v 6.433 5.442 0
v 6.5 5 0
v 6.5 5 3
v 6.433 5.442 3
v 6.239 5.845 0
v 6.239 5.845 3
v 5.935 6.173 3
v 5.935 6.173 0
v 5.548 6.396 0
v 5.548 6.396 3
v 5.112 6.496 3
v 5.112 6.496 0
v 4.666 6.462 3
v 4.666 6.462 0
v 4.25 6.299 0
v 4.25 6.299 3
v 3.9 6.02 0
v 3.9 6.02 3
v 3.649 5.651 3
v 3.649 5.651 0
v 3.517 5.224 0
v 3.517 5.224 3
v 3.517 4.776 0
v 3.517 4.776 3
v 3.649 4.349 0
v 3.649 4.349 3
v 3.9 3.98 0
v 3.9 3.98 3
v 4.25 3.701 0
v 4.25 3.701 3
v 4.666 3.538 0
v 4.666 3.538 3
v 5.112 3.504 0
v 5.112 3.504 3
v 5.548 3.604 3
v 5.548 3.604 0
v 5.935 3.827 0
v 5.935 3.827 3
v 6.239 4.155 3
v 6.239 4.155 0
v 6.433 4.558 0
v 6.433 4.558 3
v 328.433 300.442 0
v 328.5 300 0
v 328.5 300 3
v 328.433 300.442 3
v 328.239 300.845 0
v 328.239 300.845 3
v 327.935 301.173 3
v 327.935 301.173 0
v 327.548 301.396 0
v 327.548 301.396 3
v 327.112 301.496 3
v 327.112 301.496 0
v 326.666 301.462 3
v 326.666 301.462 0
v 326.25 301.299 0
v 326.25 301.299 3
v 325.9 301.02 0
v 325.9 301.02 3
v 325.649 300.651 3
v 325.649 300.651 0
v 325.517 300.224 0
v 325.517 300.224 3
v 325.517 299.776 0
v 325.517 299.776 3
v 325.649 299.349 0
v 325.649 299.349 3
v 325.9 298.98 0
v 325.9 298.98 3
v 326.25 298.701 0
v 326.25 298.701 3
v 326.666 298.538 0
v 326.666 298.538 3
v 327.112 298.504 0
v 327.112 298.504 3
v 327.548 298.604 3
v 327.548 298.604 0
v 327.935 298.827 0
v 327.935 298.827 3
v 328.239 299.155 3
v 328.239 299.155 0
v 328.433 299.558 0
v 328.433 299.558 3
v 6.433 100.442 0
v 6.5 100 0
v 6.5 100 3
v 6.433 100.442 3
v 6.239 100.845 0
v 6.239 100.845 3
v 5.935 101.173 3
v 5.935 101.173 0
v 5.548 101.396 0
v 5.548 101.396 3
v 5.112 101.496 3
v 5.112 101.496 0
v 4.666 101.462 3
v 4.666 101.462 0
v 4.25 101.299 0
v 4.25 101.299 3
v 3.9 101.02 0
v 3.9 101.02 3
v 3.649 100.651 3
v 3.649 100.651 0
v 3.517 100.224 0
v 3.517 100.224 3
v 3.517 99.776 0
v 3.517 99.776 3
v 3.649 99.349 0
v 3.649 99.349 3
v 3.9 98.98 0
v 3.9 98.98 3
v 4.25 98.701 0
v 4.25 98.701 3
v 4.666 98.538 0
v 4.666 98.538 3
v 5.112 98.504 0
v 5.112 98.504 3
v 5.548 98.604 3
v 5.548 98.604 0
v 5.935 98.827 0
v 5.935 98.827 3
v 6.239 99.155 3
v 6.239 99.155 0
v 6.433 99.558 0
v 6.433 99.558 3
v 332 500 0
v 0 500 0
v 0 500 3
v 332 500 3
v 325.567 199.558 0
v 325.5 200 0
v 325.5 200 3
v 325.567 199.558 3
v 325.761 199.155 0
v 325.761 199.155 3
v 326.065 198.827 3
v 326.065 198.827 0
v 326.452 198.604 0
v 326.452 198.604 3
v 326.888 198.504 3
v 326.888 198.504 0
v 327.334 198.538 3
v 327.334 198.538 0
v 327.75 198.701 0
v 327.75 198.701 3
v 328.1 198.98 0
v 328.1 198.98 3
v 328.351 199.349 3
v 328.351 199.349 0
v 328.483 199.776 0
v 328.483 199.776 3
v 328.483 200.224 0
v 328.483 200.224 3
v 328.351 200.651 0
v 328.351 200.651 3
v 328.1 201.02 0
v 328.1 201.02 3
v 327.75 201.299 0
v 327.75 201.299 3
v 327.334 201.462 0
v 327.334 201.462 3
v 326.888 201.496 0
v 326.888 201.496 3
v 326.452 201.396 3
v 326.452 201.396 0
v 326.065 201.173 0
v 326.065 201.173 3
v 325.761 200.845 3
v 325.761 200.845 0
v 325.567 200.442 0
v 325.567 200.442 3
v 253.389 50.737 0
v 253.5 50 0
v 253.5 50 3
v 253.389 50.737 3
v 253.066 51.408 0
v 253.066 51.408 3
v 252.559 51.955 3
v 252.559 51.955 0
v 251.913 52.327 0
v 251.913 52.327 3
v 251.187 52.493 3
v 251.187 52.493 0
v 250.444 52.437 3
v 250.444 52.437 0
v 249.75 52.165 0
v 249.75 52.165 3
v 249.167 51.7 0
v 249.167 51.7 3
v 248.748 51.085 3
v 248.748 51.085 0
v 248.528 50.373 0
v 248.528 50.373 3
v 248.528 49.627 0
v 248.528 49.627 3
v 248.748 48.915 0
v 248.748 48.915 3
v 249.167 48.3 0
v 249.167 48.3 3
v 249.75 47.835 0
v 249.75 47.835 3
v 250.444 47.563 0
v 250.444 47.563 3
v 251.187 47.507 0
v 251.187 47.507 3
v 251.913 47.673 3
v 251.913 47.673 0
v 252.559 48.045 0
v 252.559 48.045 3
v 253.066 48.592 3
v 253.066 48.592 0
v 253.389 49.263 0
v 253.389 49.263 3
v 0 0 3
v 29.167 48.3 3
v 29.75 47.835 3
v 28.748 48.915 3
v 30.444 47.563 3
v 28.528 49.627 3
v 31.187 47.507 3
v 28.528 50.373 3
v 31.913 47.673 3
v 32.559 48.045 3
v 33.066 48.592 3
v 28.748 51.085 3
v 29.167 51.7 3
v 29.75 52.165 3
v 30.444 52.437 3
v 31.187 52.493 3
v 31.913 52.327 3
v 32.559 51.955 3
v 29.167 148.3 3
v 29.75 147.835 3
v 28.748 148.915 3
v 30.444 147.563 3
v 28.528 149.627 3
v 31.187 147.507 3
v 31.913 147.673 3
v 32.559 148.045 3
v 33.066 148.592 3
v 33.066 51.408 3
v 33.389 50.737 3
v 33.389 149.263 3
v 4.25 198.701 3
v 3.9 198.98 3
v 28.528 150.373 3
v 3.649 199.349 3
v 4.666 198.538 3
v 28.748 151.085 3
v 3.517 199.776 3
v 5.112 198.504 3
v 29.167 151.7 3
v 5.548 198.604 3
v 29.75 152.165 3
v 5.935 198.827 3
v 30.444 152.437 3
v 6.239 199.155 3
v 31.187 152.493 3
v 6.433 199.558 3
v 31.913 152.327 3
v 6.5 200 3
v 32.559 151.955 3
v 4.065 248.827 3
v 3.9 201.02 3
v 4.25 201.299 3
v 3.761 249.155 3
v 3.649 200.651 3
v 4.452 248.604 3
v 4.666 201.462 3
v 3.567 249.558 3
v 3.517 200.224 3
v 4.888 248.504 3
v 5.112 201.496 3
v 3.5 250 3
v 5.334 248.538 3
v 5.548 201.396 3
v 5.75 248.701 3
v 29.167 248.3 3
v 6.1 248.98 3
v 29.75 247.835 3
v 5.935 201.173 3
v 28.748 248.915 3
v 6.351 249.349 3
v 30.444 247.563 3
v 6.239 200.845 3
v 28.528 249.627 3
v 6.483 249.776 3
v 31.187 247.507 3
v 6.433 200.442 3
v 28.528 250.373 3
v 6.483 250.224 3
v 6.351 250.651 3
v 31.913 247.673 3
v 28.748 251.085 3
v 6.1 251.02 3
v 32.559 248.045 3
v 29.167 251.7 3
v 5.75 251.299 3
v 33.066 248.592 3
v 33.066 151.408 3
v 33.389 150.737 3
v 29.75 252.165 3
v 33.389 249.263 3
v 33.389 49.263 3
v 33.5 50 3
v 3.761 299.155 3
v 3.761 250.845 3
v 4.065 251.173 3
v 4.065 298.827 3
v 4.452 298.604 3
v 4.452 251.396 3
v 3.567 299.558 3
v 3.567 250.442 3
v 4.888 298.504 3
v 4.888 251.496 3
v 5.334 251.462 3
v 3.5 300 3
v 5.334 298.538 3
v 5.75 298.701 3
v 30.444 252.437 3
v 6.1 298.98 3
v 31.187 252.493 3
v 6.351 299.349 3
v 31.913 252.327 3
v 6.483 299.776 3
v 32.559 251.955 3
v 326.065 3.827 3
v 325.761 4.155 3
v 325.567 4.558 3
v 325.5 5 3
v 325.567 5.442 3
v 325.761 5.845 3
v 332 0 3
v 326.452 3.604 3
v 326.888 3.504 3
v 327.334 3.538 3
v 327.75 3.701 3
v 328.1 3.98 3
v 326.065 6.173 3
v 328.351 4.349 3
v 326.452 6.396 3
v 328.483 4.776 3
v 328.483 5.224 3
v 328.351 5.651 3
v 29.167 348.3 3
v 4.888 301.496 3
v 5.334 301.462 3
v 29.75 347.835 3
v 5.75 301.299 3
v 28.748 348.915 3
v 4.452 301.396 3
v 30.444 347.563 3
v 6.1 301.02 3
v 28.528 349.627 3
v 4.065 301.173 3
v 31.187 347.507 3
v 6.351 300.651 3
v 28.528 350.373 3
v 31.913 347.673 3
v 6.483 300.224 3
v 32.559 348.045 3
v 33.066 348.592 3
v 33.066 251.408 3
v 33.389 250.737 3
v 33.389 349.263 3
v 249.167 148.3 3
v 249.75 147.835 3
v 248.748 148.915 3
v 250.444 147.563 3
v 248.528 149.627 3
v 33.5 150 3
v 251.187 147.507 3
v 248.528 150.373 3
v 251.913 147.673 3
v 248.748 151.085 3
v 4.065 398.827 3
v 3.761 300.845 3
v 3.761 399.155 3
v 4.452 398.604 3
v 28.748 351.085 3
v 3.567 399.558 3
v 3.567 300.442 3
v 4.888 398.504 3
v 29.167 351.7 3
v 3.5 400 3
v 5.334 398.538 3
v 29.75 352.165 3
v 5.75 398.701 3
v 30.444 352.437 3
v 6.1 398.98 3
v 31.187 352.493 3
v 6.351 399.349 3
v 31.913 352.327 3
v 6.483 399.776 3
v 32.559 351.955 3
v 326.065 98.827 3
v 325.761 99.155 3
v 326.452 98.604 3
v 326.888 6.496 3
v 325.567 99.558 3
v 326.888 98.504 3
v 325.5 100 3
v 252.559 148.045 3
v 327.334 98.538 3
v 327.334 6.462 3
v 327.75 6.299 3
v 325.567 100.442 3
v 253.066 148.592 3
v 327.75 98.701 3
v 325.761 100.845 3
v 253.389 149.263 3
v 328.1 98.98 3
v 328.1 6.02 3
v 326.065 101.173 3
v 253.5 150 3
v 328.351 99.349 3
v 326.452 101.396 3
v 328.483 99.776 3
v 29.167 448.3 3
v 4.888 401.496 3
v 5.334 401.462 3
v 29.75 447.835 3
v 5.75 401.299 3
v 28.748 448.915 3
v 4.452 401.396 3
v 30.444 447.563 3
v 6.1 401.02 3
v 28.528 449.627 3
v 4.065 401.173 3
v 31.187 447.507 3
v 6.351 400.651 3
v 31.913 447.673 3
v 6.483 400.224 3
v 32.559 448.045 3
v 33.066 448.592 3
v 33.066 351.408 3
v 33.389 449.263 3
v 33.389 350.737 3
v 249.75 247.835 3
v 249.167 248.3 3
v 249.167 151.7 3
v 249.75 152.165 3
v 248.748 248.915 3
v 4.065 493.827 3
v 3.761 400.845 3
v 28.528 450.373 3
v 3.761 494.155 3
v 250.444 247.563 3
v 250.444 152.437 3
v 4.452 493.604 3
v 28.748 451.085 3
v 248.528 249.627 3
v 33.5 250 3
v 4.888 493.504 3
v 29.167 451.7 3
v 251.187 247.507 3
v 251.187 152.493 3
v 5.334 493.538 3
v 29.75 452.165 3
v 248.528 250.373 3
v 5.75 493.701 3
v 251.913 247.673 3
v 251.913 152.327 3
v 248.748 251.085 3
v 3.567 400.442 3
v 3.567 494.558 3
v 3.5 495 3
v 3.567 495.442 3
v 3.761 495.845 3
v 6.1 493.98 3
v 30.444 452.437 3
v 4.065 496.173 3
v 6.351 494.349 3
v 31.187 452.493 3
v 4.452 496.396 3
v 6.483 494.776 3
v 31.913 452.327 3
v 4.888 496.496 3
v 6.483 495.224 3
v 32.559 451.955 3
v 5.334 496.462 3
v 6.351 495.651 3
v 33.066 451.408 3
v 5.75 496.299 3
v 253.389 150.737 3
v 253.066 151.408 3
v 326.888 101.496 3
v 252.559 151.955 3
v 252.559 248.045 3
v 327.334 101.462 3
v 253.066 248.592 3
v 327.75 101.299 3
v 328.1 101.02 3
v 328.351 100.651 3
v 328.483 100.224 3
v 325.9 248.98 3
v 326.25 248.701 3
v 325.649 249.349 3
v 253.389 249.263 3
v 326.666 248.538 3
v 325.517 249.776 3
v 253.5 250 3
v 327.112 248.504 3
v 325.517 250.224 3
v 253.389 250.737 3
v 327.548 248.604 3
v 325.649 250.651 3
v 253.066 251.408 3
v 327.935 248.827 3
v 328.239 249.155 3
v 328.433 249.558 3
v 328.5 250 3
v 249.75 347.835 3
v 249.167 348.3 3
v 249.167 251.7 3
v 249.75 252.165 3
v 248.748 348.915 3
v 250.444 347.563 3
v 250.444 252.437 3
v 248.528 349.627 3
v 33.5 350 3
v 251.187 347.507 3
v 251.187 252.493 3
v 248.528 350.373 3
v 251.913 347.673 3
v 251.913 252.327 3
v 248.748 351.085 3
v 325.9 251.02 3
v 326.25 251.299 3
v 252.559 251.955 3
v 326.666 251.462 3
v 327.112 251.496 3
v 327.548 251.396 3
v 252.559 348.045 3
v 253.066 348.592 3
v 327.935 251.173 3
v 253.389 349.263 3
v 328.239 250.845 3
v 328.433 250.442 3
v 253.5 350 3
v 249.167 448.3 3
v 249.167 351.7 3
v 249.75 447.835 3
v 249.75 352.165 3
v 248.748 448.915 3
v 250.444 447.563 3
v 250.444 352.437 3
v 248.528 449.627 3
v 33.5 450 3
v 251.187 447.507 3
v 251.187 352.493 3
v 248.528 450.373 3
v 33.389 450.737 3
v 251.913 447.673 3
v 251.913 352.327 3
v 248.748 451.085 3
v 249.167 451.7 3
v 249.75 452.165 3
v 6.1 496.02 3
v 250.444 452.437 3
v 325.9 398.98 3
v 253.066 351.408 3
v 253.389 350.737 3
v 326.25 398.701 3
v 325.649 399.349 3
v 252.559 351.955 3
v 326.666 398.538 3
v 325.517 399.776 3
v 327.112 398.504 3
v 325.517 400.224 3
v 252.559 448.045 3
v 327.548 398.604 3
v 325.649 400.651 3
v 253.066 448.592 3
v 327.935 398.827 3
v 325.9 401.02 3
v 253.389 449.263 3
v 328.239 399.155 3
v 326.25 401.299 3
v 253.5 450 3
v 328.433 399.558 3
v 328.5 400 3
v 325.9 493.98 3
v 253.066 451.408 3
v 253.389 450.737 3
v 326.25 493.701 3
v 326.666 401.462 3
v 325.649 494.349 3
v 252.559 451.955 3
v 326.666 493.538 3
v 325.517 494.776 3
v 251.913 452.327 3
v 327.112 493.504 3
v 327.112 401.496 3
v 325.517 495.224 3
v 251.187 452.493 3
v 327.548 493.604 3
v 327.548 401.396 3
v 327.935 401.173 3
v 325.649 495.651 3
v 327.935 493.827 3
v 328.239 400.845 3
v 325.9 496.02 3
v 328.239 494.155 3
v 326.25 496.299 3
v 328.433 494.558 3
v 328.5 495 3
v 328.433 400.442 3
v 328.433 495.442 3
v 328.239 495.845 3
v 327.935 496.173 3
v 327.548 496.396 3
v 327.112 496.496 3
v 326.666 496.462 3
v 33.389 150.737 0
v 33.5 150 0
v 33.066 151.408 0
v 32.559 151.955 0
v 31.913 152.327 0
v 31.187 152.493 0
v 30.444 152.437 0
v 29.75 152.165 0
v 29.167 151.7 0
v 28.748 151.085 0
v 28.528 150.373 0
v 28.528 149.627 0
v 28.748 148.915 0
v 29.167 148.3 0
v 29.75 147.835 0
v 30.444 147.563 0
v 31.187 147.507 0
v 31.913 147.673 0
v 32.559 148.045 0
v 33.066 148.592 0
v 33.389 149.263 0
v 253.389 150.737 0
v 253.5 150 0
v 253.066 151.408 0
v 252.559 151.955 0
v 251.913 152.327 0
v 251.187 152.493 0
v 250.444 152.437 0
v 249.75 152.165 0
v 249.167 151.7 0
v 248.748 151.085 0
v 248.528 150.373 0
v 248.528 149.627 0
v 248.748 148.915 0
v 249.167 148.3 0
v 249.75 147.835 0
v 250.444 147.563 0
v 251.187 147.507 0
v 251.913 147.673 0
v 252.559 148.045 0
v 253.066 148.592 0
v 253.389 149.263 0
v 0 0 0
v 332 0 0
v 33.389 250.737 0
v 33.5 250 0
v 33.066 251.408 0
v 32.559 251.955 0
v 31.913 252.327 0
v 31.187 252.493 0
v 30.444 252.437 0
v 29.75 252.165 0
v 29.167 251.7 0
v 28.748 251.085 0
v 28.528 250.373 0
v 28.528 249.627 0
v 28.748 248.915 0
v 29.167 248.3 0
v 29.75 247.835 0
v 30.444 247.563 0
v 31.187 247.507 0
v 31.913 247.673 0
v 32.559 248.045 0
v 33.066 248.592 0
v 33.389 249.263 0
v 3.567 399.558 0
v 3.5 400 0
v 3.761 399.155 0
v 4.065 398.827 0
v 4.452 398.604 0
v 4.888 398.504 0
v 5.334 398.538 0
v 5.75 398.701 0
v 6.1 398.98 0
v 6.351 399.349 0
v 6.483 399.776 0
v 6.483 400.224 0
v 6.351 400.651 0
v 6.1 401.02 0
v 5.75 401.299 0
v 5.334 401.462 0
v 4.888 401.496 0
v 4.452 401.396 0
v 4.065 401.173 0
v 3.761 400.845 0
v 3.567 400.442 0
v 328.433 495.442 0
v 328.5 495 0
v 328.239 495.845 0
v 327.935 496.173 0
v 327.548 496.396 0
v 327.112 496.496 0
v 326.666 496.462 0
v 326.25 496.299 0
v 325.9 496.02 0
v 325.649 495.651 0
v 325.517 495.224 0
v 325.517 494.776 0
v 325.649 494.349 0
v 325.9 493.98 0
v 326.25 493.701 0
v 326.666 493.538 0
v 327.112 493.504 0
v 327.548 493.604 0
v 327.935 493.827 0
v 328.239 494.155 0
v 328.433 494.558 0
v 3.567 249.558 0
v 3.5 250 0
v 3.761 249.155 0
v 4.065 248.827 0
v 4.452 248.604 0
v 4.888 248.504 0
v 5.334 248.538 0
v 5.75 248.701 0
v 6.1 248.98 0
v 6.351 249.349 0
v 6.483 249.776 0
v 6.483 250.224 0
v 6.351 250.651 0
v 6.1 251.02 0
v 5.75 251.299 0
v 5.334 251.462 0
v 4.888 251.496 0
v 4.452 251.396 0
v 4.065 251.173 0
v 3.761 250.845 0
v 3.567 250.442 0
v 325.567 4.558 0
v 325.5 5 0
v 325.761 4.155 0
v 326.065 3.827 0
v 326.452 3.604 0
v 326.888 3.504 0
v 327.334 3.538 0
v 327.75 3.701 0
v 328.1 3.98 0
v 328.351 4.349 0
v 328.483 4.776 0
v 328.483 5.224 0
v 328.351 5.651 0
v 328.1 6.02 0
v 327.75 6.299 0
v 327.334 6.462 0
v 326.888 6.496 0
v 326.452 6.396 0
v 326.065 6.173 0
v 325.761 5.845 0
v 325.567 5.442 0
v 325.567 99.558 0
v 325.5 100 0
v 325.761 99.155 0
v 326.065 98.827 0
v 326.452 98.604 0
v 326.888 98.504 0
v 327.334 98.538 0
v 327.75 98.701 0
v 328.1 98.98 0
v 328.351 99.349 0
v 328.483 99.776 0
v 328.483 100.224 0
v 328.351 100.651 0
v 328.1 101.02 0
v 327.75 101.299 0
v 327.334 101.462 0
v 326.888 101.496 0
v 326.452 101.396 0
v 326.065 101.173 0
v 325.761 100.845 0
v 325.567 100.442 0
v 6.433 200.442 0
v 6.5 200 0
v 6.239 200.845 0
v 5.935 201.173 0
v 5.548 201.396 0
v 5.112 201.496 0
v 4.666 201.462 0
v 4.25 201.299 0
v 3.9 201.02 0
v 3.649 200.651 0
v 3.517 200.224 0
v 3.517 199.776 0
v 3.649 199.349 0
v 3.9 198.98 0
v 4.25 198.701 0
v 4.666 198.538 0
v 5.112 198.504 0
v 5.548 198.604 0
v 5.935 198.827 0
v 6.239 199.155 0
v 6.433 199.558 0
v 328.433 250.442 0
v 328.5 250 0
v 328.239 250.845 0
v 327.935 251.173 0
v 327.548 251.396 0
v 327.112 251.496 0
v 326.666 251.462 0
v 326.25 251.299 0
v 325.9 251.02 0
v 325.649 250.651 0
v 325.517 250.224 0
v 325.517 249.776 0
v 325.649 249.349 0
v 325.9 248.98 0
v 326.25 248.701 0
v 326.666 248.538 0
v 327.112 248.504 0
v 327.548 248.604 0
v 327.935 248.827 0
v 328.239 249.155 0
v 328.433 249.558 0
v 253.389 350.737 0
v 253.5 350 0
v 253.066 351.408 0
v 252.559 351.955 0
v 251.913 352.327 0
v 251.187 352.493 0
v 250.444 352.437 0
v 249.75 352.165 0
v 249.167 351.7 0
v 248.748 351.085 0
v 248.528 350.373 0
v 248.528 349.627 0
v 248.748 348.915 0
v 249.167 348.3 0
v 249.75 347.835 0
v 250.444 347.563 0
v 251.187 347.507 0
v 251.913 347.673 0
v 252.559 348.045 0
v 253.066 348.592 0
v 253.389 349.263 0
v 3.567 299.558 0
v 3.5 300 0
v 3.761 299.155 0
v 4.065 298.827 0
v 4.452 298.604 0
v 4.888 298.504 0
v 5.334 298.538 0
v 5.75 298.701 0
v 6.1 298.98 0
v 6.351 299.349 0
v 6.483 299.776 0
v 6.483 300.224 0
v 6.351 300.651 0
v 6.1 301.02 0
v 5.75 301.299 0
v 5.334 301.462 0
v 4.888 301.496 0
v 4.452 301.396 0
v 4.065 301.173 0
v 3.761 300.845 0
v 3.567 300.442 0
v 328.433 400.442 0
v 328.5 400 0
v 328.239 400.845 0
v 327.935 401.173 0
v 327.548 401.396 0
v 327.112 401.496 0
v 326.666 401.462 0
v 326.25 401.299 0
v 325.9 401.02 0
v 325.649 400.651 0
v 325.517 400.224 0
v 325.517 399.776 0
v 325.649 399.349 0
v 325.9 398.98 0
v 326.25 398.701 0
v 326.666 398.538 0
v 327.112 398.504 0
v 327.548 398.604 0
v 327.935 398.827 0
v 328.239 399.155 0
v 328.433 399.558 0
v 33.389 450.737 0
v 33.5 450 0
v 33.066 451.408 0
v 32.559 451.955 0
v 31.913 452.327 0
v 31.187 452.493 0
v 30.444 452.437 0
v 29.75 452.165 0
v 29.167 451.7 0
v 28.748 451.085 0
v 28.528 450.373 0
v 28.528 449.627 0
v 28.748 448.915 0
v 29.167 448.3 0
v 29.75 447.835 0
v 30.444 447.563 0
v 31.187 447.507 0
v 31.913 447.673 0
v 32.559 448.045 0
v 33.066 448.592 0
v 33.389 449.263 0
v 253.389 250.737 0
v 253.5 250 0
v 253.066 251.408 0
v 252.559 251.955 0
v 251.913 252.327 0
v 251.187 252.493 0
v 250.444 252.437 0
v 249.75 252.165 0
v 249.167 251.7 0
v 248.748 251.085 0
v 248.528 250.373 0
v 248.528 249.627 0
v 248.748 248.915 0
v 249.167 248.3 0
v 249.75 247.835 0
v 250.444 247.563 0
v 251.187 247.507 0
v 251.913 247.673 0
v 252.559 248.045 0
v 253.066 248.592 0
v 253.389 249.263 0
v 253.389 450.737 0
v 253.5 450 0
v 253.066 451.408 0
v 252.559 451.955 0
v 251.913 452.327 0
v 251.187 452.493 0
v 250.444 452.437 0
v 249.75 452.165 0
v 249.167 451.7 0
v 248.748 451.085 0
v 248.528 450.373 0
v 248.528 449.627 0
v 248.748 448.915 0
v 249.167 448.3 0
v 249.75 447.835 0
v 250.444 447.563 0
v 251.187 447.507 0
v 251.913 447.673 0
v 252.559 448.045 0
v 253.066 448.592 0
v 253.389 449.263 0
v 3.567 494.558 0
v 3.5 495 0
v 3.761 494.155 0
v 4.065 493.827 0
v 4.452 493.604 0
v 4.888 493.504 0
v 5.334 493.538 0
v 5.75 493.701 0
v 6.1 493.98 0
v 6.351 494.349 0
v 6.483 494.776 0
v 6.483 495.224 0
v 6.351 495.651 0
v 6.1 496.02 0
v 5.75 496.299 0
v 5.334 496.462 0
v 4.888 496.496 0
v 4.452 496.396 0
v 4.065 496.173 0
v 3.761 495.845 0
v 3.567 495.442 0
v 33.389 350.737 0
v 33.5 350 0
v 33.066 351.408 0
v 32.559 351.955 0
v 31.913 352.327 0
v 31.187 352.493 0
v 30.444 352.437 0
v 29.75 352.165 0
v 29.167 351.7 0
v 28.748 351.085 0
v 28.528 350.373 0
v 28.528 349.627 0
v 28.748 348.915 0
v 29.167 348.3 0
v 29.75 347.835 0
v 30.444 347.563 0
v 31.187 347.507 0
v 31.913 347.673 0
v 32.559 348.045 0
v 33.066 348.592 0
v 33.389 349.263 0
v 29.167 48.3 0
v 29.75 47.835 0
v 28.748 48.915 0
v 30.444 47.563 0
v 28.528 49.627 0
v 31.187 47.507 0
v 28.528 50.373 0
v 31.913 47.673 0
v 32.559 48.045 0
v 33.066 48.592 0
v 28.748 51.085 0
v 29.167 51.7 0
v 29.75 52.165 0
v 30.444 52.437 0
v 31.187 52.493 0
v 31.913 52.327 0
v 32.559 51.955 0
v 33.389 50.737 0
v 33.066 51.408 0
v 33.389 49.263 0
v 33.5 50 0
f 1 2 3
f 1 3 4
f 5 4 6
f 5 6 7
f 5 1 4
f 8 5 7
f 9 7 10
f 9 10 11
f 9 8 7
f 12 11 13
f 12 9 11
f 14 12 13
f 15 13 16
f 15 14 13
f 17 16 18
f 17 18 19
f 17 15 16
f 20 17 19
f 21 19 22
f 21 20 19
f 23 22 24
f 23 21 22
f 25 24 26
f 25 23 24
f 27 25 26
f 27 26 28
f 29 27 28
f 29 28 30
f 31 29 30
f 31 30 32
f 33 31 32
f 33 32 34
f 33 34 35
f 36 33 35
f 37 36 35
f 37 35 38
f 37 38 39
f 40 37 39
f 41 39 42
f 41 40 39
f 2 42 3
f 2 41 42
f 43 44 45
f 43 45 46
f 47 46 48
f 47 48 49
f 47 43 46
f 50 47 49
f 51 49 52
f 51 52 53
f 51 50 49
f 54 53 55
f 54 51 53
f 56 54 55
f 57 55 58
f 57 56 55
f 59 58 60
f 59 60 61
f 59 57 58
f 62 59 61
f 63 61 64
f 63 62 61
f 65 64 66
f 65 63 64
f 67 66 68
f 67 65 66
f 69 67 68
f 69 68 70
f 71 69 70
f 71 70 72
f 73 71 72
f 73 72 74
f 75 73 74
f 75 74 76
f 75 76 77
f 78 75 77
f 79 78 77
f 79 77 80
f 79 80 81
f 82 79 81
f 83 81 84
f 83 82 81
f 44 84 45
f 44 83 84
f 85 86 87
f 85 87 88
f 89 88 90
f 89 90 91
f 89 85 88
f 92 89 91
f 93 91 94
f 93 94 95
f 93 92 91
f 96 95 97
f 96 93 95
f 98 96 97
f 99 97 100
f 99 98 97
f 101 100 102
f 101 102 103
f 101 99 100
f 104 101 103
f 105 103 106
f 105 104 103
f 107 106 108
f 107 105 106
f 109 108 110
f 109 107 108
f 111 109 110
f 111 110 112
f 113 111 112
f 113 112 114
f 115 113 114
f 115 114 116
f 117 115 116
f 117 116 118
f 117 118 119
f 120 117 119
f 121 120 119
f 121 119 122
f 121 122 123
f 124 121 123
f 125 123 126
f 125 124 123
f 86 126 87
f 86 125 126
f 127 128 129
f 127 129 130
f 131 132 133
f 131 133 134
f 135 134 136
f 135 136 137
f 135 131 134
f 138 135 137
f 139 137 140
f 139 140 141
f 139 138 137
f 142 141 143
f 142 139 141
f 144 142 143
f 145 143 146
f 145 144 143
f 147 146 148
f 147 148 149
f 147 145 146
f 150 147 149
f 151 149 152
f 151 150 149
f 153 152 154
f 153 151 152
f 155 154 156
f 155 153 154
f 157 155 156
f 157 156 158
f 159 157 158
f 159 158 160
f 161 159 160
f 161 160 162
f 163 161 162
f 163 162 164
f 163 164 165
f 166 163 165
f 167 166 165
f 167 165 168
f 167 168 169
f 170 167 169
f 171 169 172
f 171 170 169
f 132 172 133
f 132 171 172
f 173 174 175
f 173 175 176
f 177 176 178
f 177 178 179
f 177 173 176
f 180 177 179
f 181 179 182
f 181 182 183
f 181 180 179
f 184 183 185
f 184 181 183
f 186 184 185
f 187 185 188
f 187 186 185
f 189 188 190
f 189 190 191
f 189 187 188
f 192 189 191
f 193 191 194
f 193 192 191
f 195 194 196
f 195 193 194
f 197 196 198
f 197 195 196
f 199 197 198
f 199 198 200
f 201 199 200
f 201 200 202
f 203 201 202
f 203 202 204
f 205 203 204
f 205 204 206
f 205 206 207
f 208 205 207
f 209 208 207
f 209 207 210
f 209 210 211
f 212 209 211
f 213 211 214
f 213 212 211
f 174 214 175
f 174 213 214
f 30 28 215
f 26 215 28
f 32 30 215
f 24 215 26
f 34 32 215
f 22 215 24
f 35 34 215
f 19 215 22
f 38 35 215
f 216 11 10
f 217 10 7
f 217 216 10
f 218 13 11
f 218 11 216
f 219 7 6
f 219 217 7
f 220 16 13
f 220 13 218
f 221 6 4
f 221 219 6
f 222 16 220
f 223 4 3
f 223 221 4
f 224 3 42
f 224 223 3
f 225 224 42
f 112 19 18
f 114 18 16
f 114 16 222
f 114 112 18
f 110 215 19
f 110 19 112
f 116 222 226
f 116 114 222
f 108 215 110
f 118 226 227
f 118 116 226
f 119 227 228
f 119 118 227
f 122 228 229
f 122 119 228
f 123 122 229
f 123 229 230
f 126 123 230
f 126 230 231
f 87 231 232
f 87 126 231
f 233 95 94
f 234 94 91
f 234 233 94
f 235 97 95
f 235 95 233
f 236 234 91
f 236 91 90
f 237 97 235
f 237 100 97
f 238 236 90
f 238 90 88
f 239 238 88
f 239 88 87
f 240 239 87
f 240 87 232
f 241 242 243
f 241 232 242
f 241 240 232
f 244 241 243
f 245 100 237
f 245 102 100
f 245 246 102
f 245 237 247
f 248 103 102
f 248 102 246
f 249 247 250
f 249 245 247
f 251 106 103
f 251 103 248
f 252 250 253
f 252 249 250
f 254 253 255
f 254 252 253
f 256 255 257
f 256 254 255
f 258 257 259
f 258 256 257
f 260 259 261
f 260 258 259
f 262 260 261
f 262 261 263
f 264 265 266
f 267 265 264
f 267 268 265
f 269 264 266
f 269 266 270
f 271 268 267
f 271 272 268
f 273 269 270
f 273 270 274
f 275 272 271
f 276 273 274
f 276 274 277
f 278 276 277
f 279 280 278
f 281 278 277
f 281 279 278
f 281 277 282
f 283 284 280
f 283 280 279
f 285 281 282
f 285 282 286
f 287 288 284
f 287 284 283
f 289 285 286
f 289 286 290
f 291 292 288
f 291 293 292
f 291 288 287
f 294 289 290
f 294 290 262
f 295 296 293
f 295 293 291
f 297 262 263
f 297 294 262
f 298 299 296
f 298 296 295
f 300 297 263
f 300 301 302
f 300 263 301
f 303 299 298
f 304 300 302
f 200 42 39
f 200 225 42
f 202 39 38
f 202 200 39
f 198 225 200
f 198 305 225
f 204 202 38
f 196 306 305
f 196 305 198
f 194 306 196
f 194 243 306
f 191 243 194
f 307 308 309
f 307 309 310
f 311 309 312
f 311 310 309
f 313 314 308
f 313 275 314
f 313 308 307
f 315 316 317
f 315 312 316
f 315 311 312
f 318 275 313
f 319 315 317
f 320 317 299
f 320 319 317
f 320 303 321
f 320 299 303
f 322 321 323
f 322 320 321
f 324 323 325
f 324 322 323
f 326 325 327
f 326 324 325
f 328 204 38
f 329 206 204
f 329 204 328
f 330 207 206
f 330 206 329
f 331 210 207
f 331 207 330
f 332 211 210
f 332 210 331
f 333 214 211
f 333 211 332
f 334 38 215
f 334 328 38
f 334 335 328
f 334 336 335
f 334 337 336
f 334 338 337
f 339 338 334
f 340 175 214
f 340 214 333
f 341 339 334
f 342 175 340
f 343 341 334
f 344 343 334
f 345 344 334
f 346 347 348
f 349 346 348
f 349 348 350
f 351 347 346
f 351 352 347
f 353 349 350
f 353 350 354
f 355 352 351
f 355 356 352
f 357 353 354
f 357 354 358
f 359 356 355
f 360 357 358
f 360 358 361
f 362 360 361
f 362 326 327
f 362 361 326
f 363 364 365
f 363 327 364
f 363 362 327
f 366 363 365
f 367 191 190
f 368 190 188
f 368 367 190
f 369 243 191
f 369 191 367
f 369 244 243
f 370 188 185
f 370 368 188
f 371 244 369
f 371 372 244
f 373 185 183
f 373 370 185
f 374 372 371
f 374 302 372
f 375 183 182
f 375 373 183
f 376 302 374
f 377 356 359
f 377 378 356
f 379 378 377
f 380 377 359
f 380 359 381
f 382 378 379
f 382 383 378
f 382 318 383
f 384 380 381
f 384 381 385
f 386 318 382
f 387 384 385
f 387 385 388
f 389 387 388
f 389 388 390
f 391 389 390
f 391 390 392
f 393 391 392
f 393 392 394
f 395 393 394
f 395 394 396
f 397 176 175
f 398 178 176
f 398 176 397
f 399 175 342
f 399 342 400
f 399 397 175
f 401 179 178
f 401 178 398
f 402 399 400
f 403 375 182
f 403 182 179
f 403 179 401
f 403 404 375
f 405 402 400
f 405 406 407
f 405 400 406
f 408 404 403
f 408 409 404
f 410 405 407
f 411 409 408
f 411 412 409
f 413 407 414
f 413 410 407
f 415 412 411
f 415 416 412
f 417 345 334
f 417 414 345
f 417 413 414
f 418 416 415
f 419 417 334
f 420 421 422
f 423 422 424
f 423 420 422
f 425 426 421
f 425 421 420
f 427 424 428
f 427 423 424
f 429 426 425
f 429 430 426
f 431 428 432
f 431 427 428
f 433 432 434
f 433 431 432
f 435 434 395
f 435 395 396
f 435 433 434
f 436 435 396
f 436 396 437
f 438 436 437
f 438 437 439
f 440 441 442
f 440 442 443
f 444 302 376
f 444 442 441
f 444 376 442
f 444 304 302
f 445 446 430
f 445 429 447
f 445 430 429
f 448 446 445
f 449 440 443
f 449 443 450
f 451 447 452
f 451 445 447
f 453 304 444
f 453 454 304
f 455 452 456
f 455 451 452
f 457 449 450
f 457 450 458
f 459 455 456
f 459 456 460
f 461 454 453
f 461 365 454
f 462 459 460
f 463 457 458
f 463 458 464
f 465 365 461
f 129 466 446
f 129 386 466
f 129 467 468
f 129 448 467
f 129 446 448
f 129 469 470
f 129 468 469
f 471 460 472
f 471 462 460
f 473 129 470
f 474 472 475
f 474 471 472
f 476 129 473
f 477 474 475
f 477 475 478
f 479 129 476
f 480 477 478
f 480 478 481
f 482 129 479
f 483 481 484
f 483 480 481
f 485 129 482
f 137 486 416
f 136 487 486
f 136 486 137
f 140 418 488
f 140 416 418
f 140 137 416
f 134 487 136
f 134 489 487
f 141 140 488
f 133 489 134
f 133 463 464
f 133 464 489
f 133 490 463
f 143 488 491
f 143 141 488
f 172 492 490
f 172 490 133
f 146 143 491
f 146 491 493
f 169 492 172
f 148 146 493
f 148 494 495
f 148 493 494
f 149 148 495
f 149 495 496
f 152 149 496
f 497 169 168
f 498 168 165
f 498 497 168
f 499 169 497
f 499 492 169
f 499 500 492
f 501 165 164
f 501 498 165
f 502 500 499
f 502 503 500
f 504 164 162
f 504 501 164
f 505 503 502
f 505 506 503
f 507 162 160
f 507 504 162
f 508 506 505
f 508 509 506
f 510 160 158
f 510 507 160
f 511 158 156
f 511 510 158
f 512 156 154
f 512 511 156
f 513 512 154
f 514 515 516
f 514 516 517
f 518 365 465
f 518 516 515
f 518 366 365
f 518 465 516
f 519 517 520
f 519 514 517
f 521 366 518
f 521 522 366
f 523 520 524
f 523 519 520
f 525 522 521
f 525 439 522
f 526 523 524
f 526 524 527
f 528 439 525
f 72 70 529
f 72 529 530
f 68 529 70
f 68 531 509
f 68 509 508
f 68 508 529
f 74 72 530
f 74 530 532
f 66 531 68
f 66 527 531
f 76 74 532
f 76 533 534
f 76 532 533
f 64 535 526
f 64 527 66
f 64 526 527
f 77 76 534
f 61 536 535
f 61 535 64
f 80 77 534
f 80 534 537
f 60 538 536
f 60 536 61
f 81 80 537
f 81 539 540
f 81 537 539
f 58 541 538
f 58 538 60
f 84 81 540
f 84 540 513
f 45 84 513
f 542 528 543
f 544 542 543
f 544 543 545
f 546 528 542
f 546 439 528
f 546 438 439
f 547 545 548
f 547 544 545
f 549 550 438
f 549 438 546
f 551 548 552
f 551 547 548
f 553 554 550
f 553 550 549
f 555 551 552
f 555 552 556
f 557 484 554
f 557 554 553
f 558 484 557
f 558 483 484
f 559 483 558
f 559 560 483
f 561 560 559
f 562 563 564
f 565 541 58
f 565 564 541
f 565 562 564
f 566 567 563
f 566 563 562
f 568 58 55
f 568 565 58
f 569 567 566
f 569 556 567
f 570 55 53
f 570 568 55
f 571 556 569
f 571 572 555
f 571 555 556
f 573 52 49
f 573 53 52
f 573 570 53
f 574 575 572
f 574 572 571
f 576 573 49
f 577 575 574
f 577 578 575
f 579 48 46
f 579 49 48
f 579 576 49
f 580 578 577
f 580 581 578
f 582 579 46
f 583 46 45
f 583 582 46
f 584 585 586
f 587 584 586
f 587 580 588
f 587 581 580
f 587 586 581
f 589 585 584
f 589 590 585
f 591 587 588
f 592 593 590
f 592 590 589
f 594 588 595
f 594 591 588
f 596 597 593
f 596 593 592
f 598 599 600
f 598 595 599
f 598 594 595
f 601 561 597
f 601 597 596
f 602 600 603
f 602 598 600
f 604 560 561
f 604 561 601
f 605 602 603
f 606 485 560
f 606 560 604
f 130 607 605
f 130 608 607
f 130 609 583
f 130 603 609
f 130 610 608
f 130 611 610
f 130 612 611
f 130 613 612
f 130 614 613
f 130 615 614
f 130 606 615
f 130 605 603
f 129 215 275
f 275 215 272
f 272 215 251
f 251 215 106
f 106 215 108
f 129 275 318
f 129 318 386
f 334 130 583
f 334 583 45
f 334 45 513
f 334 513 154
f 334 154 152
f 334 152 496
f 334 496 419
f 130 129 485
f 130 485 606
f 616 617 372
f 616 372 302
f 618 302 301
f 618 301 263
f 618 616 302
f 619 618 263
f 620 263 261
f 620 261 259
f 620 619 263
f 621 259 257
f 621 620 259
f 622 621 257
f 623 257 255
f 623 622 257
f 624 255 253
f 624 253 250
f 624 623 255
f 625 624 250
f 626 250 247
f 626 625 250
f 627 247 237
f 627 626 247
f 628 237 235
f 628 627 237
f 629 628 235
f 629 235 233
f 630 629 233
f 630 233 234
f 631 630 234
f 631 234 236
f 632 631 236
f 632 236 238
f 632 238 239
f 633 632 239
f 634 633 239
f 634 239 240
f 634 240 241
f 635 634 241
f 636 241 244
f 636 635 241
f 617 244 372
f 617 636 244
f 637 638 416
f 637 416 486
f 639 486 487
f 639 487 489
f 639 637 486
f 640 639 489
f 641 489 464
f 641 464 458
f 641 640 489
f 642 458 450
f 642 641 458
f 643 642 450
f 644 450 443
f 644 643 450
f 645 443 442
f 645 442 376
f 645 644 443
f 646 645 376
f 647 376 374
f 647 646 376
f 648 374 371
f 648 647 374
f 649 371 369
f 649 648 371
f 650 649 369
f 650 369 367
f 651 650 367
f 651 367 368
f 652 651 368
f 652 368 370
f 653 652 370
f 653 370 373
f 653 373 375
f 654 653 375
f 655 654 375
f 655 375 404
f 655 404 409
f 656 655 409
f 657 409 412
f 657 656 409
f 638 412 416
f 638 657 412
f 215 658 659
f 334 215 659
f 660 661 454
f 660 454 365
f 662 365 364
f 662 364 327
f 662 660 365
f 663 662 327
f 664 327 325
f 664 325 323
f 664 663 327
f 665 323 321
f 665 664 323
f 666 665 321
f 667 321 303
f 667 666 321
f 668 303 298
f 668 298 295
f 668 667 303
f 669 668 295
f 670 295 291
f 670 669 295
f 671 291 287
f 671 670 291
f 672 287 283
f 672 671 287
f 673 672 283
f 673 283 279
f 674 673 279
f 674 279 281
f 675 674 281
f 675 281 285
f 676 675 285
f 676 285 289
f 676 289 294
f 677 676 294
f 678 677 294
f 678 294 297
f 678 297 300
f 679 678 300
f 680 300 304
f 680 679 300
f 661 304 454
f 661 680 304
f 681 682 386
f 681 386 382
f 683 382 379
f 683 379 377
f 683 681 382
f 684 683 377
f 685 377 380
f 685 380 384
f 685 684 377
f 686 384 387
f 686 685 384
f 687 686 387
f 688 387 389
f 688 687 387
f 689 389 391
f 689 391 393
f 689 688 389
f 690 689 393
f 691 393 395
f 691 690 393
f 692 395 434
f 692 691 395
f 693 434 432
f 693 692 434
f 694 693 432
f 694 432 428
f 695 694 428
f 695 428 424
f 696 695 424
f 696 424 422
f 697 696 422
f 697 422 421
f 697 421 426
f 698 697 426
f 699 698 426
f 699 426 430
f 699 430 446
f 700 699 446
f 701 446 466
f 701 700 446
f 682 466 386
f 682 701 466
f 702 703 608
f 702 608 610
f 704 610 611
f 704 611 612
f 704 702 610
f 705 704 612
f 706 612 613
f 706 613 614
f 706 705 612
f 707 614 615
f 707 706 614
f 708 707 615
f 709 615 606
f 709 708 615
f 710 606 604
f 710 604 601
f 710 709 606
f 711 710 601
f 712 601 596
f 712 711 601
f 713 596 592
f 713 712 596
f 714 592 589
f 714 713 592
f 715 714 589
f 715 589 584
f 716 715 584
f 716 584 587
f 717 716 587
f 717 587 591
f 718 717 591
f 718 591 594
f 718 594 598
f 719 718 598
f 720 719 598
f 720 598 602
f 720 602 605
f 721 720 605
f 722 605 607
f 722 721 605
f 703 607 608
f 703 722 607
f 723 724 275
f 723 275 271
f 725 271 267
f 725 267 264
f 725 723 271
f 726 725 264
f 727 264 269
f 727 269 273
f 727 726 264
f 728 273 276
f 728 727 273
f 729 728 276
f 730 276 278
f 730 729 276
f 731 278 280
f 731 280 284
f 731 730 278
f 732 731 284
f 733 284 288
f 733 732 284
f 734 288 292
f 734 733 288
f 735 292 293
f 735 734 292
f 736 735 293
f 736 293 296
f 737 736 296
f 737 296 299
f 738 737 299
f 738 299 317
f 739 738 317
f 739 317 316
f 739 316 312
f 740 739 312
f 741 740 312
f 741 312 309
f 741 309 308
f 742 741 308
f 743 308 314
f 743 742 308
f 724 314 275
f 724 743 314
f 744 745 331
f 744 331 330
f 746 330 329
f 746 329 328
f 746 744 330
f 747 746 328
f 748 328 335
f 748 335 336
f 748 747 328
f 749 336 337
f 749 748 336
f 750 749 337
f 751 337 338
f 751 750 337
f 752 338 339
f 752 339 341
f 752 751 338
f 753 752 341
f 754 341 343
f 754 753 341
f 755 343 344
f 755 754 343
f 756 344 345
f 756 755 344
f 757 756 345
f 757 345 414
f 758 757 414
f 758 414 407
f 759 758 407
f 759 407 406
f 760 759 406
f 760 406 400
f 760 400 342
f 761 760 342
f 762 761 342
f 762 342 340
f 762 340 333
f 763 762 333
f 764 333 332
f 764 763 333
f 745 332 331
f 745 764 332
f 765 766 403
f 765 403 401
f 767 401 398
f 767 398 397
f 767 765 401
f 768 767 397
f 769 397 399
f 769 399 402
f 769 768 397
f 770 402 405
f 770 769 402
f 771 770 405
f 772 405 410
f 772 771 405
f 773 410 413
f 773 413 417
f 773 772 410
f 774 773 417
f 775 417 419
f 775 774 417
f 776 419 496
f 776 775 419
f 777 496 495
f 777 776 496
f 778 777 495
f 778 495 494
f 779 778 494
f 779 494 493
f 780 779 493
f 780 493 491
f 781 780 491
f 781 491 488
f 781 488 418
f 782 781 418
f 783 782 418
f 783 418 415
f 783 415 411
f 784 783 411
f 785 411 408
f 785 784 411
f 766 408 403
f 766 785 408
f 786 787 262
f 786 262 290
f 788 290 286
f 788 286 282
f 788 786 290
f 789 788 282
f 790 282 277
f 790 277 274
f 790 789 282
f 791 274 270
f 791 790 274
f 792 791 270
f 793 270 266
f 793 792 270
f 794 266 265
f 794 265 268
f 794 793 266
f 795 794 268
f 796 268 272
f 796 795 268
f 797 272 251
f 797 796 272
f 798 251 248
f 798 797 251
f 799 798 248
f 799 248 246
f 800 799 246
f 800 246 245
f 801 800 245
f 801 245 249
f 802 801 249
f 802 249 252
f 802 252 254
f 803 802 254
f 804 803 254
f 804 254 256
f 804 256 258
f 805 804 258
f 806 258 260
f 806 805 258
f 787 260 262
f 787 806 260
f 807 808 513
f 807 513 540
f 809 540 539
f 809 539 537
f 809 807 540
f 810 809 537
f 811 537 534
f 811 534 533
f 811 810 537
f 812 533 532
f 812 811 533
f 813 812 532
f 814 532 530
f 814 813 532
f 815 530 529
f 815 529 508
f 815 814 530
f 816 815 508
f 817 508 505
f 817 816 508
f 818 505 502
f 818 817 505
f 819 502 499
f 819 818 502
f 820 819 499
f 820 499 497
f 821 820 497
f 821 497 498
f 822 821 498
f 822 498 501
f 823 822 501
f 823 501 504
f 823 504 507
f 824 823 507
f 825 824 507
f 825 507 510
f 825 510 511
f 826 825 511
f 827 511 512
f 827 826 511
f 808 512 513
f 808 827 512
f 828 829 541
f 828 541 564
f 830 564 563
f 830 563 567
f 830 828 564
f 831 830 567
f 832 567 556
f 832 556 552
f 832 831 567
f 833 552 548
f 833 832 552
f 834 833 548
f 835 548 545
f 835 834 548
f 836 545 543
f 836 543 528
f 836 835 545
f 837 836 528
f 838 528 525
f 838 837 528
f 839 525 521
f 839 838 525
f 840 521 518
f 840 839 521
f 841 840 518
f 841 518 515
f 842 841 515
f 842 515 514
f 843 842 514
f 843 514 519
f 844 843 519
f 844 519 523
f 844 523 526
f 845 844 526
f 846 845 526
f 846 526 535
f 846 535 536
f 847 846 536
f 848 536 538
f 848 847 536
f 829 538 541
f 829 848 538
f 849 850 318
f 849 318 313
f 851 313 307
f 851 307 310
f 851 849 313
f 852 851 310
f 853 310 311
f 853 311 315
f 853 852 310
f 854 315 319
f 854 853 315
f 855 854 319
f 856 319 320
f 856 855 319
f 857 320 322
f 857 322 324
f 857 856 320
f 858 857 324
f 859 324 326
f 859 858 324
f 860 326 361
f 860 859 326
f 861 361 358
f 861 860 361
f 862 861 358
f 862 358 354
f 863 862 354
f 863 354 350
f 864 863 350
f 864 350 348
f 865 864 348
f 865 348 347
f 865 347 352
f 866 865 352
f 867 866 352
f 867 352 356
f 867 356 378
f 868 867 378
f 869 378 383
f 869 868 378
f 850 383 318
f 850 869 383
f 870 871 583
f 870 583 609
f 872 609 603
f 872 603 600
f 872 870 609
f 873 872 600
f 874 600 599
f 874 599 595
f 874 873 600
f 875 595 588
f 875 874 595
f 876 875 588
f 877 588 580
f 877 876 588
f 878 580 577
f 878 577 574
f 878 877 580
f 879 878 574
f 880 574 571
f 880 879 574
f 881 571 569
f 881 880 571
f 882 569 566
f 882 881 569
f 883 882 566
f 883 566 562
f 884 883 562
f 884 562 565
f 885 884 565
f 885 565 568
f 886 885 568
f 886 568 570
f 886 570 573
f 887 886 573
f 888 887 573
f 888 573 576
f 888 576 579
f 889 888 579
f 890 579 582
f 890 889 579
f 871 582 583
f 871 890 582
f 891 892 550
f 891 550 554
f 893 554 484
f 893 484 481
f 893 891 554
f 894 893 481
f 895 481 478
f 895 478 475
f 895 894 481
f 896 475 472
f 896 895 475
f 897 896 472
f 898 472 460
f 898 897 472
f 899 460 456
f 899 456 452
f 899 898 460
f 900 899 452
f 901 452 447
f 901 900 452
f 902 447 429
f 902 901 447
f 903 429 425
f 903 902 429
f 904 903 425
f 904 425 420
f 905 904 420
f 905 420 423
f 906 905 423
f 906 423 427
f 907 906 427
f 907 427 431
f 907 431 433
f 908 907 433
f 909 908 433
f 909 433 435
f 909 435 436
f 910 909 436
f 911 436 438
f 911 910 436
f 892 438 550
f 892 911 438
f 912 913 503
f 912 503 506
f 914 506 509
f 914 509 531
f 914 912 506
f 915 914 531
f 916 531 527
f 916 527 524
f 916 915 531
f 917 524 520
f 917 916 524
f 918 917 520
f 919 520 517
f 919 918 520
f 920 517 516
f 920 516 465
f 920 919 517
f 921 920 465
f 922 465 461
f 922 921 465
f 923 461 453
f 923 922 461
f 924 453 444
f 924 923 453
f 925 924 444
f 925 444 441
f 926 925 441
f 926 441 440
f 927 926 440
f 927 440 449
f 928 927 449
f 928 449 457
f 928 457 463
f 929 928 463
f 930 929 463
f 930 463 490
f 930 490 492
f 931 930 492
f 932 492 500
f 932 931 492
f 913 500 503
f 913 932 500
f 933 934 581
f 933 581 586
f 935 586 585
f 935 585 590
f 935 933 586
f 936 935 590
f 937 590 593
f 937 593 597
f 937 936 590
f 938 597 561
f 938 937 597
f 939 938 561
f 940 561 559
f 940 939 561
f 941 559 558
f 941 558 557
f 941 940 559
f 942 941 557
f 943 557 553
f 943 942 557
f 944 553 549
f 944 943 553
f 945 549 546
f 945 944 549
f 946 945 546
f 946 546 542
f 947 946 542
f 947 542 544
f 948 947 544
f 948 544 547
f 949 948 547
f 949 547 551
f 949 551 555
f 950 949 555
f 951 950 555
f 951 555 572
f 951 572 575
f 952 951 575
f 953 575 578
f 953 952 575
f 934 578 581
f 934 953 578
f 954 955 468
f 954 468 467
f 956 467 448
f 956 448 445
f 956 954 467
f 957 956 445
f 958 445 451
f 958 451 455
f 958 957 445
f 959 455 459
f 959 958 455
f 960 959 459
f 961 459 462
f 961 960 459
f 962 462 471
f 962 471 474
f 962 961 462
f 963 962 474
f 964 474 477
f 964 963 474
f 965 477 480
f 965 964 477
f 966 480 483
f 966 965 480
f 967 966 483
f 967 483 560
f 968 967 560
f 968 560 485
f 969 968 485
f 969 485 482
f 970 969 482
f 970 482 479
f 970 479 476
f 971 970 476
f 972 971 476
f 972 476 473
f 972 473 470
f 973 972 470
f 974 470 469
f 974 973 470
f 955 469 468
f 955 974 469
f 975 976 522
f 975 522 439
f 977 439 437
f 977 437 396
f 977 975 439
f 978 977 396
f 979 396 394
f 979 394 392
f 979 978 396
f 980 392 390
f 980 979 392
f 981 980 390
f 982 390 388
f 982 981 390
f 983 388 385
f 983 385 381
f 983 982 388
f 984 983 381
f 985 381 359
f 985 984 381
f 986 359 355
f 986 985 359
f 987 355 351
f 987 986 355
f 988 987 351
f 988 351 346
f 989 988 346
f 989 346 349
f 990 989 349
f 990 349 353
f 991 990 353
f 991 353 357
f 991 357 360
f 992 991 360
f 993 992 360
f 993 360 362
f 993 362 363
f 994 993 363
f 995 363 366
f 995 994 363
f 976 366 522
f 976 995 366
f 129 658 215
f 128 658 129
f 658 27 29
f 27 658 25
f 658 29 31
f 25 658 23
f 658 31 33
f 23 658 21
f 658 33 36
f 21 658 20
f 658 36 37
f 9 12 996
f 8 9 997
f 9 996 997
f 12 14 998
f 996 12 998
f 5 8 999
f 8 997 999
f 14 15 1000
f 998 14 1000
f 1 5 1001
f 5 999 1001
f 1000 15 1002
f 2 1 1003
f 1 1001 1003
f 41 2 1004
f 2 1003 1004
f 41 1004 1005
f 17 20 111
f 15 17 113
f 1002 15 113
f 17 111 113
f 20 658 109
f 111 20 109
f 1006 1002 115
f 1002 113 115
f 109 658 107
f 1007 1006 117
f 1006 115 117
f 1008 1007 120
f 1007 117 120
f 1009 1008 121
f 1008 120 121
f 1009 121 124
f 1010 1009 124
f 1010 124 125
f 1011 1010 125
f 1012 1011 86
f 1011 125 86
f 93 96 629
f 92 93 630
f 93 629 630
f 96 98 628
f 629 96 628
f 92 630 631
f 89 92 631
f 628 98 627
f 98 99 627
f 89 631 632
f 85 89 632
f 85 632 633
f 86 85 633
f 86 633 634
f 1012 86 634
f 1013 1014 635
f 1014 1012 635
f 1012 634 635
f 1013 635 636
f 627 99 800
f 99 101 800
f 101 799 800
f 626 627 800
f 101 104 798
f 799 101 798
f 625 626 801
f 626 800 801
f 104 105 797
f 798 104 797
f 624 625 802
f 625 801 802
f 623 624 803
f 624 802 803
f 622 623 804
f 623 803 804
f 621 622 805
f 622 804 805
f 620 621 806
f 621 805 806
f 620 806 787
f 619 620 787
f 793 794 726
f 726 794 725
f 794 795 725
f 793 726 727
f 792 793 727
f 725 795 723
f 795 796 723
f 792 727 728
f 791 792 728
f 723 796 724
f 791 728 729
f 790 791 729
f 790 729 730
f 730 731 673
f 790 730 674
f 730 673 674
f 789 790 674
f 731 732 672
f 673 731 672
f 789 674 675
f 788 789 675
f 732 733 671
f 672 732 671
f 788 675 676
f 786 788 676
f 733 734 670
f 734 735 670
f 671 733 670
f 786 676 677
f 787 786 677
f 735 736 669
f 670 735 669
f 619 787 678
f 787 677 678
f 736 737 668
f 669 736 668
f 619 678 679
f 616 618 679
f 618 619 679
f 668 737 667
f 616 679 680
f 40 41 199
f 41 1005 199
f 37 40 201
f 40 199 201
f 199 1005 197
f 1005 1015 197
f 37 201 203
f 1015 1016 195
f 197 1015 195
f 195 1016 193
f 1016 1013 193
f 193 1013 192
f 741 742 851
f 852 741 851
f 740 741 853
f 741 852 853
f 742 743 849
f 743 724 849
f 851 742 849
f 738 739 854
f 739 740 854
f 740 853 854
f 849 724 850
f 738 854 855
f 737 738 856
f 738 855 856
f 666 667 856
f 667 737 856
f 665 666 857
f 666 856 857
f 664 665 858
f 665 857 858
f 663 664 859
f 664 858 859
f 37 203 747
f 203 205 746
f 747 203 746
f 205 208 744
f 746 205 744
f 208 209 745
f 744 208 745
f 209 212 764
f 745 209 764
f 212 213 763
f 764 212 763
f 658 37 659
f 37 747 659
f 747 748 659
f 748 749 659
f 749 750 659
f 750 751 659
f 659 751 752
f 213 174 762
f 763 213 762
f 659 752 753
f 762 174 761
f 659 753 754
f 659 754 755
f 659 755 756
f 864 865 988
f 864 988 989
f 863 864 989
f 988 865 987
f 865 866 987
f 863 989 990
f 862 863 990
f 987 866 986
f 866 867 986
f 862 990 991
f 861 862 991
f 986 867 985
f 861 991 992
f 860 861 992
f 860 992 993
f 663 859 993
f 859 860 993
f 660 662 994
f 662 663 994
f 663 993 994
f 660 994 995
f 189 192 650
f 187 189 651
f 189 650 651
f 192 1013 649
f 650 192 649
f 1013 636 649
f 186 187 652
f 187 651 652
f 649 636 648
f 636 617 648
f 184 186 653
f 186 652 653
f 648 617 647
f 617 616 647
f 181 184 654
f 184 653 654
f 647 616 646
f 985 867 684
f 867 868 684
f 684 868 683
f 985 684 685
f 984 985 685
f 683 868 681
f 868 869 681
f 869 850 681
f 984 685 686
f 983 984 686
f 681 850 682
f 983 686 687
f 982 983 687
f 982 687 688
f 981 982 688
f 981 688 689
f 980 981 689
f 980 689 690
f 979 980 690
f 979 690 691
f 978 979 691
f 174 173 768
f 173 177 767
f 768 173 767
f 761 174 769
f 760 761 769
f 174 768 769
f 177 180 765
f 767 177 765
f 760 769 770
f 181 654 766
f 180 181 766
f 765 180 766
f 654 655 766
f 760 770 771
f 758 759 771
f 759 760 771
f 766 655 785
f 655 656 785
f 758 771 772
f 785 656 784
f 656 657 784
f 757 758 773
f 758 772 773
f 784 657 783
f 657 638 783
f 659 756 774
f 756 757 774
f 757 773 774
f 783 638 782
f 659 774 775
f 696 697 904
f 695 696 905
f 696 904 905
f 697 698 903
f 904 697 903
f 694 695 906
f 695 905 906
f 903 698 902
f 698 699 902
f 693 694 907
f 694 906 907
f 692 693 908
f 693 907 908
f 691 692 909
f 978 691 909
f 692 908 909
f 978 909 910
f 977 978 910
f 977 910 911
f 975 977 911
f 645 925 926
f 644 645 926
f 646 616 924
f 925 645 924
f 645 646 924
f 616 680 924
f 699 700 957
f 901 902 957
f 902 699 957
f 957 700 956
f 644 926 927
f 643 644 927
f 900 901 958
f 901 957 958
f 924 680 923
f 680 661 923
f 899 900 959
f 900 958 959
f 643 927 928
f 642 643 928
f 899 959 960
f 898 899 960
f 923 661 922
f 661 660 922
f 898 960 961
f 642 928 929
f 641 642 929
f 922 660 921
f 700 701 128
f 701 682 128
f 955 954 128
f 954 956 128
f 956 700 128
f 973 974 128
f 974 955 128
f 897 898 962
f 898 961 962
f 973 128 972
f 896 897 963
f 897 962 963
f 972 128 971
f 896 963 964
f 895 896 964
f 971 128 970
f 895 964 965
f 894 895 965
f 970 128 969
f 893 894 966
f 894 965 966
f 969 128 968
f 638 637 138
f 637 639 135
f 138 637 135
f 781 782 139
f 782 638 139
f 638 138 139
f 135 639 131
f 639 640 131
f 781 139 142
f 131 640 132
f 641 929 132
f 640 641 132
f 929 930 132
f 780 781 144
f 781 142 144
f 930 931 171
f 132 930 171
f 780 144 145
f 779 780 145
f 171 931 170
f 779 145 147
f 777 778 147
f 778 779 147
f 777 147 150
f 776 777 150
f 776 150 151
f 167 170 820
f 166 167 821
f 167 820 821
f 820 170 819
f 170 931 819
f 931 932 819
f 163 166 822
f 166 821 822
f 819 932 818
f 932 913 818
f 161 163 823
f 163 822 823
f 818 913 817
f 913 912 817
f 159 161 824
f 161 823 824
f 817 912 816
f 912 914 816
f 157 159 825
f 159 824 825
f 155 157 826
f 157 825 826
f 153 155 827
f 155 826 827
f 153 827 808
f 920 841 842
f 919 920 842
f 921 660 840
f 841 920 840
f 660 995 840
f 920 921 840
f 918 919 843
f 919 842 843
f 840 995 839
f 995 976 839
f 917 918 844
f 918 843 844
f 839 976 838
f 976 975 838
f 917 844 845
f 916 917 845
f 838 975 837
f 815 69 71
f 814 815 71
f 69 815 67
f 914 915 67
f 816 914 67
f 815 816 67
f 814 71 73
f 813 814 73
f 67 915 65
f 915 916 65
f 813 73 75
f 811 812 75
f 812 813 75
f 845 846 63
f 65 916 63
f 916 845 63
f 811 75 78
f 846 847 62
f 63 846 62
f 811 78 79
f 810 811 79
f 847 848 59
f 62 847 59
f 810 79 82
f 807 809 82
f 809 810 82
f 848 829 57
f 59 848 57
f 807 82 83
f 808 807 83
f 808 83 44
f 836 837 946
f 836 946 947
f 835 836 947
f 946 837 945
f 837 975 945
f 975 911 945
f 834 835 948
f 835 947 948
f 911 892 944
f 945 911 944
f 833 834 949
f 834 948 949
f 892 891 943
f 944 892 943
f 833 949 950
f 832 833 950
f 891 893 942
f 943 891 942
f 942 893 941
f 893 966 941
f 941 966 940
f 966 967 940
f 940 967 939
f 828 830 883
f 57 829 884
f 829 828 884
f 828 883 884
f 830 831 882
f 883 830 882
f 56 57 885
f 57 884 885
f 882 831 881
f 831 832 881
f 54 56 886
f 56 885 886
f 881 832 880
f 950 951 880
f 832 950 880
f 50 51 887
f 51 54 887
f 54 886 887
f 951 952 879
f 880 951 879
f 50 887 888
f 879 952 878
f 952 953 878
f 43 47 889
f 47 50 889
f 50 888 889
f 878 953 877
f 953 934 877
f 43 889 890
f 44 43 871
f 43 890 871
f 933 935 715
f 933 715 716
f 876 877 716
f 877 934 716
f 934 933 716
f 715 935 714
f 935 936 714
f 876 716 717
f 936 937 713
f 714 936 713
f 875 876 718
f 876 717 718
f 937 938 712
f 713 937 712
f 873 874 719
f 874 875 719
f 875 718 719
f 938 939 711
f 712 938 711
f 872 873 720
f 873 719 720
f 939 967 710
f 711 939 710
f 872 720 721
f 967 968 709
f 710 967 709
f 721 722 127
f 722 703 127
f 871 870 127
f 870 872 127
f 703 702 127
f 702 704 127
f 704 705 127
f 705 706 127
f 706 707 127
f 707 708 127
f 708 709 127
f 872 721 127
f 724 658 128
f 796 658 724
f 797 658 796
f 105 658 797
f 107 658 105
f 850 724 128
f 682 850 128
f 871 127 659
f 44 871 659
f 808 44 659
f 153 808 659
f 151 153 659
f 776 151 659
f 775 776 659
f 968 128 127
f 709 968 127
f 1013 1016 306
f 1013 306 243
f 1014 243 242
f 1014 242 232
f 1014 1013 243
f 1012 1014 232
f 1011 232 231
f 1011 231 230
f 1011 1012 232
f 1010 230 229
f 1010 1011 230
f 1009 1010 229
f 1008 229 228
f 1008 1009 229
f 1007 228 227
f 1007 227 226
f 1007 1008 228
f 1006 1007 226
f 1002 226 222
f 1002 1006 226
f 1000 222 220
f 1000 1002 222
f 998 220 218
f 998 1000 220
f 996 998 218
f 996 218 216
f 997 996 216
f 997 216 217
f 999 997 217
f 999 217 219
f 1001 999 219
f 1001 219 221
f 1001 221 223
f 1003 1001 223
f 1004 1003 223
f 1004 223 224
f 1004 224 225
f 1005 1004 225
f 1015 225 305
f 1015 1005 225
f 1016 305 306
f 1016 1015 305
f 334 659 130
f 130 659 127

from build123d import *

# Parameters (mm, degrees)
SKETCH_1_W      = 332
SKETCH_1_H      = 500
SKETCH_1_R      = 1.5
SKETCH_1_R_2    = 2.5
EXTRUDE_1_DEPTH = 3


with BuildPart() as part:
    # 草图1 → 凸台-拉伸1 (new body)
    with BuildSketch(Plane.XY):
        with Locations((166, 250)):
            Rectangle(SKETCH_1_W, SKETCH_1_H)
        with Locations((327, 250)):
            Circle(SKETCH_1_R, mode=Mode.SUBTRACT)
        with Locations((327, 300)):
            Circle(SKETCH_1_R, mode=Mode.SUBTRACT)
        with Locations((327, 400)):
            Circle(SKETCH_1_R, mode=Mode.SUBTRACT)
        with Locations((327, 495)):
            Circle(SKETCH_1_R, mode=Mode.SUBTRACT)
        with Locations(Location((327, 5, 0), (0, 0, 180))):
            Circle(SKETCH_1_R, mode=Mode.SUBTRACT)
        with Locations(Location((327, 100, 0), (0, 0, 180))):
            Circle(SKETCH_1_R, mode=Mode.SUBTRACT)
        with Locations(Location((327, 200, 0), (0, 0, 180))):
            Circle(SKETCH_1_R, mode=Mode.SUBTRACT)
        with Locations((5, 200)):
            Circle(SKETCH_1_R, mode=Mode.SUBTRACT)
        with Locations((5, 100)):
            Circle(SKETCH_1_R, mode=Mode.SUBTRACT)
        with Locations((5, 5)):
            Circle(SKETCH_1_R, mode=Mode.SUBTRACT)
        with Locations(Location((5, 495, 0), (0, 0, 180))):
            Circle(SKETCH_1_R, mode=Mode.SUBTRACT)
        with Locations(Location((5, 400, 0), (0, 0, 180))):
            Circle(SKETCH_1_R, mode=Mode.SUBTRACT)
        with Locations(Location((5, 300, 0), (0, 0, 180))):
            Circle(SKETCH_1_R, mode=Mode.SUBTRACT)
        with Locations(Location((5, 250, 0), (0, 0, 180))):
            Circle(SKETCH_1_R, mode=Mode.SUBTRACT)
        with Locations((251, 250)):
            Circle(SKETCH_1_R_2, mode=Mode.SUBTRACT)
        with Locations((251, 150)):
            Circle(SKETCH_1_R_2, mode=Mode.SUBTRACT)
        with Locations((251, 50)):
            Circle(SKETCH_1_R_2, mode=Mode.SUBTRACT)
        with Locations((251, 350)):
            Circle(SKETCH_1_R_2, mode=Mode.SUBTRACT)
        with Locations((251, 450)):
            Circle(SKETCH_1_R_2, mode=Mode.SUBTRACT)
        with Locations((31, 150)):
            Circle(SKETCH_1_R_2, mode=Mode.SUBTRACT)
        with Locations((31, 350)):
            Circle(SKETCH_1_R_2, mode=Mode.SUBTRACT)
        with Locations((31, 450)):
            Circle(SKETCH_1_R_2, mode=Mode.SUBTRACT)
        with Locations((31, 250)):
            Circle(SKETCH_1_R_2, mode=Mode.SUBTRACT)
        with Locations((31, 50)):
            Circle(SKETCH_1_R_2, mode=Mode.SUBTRACT)
    extrude(amount=EXTRUDE_1_DEPTH)


solid = part.part
